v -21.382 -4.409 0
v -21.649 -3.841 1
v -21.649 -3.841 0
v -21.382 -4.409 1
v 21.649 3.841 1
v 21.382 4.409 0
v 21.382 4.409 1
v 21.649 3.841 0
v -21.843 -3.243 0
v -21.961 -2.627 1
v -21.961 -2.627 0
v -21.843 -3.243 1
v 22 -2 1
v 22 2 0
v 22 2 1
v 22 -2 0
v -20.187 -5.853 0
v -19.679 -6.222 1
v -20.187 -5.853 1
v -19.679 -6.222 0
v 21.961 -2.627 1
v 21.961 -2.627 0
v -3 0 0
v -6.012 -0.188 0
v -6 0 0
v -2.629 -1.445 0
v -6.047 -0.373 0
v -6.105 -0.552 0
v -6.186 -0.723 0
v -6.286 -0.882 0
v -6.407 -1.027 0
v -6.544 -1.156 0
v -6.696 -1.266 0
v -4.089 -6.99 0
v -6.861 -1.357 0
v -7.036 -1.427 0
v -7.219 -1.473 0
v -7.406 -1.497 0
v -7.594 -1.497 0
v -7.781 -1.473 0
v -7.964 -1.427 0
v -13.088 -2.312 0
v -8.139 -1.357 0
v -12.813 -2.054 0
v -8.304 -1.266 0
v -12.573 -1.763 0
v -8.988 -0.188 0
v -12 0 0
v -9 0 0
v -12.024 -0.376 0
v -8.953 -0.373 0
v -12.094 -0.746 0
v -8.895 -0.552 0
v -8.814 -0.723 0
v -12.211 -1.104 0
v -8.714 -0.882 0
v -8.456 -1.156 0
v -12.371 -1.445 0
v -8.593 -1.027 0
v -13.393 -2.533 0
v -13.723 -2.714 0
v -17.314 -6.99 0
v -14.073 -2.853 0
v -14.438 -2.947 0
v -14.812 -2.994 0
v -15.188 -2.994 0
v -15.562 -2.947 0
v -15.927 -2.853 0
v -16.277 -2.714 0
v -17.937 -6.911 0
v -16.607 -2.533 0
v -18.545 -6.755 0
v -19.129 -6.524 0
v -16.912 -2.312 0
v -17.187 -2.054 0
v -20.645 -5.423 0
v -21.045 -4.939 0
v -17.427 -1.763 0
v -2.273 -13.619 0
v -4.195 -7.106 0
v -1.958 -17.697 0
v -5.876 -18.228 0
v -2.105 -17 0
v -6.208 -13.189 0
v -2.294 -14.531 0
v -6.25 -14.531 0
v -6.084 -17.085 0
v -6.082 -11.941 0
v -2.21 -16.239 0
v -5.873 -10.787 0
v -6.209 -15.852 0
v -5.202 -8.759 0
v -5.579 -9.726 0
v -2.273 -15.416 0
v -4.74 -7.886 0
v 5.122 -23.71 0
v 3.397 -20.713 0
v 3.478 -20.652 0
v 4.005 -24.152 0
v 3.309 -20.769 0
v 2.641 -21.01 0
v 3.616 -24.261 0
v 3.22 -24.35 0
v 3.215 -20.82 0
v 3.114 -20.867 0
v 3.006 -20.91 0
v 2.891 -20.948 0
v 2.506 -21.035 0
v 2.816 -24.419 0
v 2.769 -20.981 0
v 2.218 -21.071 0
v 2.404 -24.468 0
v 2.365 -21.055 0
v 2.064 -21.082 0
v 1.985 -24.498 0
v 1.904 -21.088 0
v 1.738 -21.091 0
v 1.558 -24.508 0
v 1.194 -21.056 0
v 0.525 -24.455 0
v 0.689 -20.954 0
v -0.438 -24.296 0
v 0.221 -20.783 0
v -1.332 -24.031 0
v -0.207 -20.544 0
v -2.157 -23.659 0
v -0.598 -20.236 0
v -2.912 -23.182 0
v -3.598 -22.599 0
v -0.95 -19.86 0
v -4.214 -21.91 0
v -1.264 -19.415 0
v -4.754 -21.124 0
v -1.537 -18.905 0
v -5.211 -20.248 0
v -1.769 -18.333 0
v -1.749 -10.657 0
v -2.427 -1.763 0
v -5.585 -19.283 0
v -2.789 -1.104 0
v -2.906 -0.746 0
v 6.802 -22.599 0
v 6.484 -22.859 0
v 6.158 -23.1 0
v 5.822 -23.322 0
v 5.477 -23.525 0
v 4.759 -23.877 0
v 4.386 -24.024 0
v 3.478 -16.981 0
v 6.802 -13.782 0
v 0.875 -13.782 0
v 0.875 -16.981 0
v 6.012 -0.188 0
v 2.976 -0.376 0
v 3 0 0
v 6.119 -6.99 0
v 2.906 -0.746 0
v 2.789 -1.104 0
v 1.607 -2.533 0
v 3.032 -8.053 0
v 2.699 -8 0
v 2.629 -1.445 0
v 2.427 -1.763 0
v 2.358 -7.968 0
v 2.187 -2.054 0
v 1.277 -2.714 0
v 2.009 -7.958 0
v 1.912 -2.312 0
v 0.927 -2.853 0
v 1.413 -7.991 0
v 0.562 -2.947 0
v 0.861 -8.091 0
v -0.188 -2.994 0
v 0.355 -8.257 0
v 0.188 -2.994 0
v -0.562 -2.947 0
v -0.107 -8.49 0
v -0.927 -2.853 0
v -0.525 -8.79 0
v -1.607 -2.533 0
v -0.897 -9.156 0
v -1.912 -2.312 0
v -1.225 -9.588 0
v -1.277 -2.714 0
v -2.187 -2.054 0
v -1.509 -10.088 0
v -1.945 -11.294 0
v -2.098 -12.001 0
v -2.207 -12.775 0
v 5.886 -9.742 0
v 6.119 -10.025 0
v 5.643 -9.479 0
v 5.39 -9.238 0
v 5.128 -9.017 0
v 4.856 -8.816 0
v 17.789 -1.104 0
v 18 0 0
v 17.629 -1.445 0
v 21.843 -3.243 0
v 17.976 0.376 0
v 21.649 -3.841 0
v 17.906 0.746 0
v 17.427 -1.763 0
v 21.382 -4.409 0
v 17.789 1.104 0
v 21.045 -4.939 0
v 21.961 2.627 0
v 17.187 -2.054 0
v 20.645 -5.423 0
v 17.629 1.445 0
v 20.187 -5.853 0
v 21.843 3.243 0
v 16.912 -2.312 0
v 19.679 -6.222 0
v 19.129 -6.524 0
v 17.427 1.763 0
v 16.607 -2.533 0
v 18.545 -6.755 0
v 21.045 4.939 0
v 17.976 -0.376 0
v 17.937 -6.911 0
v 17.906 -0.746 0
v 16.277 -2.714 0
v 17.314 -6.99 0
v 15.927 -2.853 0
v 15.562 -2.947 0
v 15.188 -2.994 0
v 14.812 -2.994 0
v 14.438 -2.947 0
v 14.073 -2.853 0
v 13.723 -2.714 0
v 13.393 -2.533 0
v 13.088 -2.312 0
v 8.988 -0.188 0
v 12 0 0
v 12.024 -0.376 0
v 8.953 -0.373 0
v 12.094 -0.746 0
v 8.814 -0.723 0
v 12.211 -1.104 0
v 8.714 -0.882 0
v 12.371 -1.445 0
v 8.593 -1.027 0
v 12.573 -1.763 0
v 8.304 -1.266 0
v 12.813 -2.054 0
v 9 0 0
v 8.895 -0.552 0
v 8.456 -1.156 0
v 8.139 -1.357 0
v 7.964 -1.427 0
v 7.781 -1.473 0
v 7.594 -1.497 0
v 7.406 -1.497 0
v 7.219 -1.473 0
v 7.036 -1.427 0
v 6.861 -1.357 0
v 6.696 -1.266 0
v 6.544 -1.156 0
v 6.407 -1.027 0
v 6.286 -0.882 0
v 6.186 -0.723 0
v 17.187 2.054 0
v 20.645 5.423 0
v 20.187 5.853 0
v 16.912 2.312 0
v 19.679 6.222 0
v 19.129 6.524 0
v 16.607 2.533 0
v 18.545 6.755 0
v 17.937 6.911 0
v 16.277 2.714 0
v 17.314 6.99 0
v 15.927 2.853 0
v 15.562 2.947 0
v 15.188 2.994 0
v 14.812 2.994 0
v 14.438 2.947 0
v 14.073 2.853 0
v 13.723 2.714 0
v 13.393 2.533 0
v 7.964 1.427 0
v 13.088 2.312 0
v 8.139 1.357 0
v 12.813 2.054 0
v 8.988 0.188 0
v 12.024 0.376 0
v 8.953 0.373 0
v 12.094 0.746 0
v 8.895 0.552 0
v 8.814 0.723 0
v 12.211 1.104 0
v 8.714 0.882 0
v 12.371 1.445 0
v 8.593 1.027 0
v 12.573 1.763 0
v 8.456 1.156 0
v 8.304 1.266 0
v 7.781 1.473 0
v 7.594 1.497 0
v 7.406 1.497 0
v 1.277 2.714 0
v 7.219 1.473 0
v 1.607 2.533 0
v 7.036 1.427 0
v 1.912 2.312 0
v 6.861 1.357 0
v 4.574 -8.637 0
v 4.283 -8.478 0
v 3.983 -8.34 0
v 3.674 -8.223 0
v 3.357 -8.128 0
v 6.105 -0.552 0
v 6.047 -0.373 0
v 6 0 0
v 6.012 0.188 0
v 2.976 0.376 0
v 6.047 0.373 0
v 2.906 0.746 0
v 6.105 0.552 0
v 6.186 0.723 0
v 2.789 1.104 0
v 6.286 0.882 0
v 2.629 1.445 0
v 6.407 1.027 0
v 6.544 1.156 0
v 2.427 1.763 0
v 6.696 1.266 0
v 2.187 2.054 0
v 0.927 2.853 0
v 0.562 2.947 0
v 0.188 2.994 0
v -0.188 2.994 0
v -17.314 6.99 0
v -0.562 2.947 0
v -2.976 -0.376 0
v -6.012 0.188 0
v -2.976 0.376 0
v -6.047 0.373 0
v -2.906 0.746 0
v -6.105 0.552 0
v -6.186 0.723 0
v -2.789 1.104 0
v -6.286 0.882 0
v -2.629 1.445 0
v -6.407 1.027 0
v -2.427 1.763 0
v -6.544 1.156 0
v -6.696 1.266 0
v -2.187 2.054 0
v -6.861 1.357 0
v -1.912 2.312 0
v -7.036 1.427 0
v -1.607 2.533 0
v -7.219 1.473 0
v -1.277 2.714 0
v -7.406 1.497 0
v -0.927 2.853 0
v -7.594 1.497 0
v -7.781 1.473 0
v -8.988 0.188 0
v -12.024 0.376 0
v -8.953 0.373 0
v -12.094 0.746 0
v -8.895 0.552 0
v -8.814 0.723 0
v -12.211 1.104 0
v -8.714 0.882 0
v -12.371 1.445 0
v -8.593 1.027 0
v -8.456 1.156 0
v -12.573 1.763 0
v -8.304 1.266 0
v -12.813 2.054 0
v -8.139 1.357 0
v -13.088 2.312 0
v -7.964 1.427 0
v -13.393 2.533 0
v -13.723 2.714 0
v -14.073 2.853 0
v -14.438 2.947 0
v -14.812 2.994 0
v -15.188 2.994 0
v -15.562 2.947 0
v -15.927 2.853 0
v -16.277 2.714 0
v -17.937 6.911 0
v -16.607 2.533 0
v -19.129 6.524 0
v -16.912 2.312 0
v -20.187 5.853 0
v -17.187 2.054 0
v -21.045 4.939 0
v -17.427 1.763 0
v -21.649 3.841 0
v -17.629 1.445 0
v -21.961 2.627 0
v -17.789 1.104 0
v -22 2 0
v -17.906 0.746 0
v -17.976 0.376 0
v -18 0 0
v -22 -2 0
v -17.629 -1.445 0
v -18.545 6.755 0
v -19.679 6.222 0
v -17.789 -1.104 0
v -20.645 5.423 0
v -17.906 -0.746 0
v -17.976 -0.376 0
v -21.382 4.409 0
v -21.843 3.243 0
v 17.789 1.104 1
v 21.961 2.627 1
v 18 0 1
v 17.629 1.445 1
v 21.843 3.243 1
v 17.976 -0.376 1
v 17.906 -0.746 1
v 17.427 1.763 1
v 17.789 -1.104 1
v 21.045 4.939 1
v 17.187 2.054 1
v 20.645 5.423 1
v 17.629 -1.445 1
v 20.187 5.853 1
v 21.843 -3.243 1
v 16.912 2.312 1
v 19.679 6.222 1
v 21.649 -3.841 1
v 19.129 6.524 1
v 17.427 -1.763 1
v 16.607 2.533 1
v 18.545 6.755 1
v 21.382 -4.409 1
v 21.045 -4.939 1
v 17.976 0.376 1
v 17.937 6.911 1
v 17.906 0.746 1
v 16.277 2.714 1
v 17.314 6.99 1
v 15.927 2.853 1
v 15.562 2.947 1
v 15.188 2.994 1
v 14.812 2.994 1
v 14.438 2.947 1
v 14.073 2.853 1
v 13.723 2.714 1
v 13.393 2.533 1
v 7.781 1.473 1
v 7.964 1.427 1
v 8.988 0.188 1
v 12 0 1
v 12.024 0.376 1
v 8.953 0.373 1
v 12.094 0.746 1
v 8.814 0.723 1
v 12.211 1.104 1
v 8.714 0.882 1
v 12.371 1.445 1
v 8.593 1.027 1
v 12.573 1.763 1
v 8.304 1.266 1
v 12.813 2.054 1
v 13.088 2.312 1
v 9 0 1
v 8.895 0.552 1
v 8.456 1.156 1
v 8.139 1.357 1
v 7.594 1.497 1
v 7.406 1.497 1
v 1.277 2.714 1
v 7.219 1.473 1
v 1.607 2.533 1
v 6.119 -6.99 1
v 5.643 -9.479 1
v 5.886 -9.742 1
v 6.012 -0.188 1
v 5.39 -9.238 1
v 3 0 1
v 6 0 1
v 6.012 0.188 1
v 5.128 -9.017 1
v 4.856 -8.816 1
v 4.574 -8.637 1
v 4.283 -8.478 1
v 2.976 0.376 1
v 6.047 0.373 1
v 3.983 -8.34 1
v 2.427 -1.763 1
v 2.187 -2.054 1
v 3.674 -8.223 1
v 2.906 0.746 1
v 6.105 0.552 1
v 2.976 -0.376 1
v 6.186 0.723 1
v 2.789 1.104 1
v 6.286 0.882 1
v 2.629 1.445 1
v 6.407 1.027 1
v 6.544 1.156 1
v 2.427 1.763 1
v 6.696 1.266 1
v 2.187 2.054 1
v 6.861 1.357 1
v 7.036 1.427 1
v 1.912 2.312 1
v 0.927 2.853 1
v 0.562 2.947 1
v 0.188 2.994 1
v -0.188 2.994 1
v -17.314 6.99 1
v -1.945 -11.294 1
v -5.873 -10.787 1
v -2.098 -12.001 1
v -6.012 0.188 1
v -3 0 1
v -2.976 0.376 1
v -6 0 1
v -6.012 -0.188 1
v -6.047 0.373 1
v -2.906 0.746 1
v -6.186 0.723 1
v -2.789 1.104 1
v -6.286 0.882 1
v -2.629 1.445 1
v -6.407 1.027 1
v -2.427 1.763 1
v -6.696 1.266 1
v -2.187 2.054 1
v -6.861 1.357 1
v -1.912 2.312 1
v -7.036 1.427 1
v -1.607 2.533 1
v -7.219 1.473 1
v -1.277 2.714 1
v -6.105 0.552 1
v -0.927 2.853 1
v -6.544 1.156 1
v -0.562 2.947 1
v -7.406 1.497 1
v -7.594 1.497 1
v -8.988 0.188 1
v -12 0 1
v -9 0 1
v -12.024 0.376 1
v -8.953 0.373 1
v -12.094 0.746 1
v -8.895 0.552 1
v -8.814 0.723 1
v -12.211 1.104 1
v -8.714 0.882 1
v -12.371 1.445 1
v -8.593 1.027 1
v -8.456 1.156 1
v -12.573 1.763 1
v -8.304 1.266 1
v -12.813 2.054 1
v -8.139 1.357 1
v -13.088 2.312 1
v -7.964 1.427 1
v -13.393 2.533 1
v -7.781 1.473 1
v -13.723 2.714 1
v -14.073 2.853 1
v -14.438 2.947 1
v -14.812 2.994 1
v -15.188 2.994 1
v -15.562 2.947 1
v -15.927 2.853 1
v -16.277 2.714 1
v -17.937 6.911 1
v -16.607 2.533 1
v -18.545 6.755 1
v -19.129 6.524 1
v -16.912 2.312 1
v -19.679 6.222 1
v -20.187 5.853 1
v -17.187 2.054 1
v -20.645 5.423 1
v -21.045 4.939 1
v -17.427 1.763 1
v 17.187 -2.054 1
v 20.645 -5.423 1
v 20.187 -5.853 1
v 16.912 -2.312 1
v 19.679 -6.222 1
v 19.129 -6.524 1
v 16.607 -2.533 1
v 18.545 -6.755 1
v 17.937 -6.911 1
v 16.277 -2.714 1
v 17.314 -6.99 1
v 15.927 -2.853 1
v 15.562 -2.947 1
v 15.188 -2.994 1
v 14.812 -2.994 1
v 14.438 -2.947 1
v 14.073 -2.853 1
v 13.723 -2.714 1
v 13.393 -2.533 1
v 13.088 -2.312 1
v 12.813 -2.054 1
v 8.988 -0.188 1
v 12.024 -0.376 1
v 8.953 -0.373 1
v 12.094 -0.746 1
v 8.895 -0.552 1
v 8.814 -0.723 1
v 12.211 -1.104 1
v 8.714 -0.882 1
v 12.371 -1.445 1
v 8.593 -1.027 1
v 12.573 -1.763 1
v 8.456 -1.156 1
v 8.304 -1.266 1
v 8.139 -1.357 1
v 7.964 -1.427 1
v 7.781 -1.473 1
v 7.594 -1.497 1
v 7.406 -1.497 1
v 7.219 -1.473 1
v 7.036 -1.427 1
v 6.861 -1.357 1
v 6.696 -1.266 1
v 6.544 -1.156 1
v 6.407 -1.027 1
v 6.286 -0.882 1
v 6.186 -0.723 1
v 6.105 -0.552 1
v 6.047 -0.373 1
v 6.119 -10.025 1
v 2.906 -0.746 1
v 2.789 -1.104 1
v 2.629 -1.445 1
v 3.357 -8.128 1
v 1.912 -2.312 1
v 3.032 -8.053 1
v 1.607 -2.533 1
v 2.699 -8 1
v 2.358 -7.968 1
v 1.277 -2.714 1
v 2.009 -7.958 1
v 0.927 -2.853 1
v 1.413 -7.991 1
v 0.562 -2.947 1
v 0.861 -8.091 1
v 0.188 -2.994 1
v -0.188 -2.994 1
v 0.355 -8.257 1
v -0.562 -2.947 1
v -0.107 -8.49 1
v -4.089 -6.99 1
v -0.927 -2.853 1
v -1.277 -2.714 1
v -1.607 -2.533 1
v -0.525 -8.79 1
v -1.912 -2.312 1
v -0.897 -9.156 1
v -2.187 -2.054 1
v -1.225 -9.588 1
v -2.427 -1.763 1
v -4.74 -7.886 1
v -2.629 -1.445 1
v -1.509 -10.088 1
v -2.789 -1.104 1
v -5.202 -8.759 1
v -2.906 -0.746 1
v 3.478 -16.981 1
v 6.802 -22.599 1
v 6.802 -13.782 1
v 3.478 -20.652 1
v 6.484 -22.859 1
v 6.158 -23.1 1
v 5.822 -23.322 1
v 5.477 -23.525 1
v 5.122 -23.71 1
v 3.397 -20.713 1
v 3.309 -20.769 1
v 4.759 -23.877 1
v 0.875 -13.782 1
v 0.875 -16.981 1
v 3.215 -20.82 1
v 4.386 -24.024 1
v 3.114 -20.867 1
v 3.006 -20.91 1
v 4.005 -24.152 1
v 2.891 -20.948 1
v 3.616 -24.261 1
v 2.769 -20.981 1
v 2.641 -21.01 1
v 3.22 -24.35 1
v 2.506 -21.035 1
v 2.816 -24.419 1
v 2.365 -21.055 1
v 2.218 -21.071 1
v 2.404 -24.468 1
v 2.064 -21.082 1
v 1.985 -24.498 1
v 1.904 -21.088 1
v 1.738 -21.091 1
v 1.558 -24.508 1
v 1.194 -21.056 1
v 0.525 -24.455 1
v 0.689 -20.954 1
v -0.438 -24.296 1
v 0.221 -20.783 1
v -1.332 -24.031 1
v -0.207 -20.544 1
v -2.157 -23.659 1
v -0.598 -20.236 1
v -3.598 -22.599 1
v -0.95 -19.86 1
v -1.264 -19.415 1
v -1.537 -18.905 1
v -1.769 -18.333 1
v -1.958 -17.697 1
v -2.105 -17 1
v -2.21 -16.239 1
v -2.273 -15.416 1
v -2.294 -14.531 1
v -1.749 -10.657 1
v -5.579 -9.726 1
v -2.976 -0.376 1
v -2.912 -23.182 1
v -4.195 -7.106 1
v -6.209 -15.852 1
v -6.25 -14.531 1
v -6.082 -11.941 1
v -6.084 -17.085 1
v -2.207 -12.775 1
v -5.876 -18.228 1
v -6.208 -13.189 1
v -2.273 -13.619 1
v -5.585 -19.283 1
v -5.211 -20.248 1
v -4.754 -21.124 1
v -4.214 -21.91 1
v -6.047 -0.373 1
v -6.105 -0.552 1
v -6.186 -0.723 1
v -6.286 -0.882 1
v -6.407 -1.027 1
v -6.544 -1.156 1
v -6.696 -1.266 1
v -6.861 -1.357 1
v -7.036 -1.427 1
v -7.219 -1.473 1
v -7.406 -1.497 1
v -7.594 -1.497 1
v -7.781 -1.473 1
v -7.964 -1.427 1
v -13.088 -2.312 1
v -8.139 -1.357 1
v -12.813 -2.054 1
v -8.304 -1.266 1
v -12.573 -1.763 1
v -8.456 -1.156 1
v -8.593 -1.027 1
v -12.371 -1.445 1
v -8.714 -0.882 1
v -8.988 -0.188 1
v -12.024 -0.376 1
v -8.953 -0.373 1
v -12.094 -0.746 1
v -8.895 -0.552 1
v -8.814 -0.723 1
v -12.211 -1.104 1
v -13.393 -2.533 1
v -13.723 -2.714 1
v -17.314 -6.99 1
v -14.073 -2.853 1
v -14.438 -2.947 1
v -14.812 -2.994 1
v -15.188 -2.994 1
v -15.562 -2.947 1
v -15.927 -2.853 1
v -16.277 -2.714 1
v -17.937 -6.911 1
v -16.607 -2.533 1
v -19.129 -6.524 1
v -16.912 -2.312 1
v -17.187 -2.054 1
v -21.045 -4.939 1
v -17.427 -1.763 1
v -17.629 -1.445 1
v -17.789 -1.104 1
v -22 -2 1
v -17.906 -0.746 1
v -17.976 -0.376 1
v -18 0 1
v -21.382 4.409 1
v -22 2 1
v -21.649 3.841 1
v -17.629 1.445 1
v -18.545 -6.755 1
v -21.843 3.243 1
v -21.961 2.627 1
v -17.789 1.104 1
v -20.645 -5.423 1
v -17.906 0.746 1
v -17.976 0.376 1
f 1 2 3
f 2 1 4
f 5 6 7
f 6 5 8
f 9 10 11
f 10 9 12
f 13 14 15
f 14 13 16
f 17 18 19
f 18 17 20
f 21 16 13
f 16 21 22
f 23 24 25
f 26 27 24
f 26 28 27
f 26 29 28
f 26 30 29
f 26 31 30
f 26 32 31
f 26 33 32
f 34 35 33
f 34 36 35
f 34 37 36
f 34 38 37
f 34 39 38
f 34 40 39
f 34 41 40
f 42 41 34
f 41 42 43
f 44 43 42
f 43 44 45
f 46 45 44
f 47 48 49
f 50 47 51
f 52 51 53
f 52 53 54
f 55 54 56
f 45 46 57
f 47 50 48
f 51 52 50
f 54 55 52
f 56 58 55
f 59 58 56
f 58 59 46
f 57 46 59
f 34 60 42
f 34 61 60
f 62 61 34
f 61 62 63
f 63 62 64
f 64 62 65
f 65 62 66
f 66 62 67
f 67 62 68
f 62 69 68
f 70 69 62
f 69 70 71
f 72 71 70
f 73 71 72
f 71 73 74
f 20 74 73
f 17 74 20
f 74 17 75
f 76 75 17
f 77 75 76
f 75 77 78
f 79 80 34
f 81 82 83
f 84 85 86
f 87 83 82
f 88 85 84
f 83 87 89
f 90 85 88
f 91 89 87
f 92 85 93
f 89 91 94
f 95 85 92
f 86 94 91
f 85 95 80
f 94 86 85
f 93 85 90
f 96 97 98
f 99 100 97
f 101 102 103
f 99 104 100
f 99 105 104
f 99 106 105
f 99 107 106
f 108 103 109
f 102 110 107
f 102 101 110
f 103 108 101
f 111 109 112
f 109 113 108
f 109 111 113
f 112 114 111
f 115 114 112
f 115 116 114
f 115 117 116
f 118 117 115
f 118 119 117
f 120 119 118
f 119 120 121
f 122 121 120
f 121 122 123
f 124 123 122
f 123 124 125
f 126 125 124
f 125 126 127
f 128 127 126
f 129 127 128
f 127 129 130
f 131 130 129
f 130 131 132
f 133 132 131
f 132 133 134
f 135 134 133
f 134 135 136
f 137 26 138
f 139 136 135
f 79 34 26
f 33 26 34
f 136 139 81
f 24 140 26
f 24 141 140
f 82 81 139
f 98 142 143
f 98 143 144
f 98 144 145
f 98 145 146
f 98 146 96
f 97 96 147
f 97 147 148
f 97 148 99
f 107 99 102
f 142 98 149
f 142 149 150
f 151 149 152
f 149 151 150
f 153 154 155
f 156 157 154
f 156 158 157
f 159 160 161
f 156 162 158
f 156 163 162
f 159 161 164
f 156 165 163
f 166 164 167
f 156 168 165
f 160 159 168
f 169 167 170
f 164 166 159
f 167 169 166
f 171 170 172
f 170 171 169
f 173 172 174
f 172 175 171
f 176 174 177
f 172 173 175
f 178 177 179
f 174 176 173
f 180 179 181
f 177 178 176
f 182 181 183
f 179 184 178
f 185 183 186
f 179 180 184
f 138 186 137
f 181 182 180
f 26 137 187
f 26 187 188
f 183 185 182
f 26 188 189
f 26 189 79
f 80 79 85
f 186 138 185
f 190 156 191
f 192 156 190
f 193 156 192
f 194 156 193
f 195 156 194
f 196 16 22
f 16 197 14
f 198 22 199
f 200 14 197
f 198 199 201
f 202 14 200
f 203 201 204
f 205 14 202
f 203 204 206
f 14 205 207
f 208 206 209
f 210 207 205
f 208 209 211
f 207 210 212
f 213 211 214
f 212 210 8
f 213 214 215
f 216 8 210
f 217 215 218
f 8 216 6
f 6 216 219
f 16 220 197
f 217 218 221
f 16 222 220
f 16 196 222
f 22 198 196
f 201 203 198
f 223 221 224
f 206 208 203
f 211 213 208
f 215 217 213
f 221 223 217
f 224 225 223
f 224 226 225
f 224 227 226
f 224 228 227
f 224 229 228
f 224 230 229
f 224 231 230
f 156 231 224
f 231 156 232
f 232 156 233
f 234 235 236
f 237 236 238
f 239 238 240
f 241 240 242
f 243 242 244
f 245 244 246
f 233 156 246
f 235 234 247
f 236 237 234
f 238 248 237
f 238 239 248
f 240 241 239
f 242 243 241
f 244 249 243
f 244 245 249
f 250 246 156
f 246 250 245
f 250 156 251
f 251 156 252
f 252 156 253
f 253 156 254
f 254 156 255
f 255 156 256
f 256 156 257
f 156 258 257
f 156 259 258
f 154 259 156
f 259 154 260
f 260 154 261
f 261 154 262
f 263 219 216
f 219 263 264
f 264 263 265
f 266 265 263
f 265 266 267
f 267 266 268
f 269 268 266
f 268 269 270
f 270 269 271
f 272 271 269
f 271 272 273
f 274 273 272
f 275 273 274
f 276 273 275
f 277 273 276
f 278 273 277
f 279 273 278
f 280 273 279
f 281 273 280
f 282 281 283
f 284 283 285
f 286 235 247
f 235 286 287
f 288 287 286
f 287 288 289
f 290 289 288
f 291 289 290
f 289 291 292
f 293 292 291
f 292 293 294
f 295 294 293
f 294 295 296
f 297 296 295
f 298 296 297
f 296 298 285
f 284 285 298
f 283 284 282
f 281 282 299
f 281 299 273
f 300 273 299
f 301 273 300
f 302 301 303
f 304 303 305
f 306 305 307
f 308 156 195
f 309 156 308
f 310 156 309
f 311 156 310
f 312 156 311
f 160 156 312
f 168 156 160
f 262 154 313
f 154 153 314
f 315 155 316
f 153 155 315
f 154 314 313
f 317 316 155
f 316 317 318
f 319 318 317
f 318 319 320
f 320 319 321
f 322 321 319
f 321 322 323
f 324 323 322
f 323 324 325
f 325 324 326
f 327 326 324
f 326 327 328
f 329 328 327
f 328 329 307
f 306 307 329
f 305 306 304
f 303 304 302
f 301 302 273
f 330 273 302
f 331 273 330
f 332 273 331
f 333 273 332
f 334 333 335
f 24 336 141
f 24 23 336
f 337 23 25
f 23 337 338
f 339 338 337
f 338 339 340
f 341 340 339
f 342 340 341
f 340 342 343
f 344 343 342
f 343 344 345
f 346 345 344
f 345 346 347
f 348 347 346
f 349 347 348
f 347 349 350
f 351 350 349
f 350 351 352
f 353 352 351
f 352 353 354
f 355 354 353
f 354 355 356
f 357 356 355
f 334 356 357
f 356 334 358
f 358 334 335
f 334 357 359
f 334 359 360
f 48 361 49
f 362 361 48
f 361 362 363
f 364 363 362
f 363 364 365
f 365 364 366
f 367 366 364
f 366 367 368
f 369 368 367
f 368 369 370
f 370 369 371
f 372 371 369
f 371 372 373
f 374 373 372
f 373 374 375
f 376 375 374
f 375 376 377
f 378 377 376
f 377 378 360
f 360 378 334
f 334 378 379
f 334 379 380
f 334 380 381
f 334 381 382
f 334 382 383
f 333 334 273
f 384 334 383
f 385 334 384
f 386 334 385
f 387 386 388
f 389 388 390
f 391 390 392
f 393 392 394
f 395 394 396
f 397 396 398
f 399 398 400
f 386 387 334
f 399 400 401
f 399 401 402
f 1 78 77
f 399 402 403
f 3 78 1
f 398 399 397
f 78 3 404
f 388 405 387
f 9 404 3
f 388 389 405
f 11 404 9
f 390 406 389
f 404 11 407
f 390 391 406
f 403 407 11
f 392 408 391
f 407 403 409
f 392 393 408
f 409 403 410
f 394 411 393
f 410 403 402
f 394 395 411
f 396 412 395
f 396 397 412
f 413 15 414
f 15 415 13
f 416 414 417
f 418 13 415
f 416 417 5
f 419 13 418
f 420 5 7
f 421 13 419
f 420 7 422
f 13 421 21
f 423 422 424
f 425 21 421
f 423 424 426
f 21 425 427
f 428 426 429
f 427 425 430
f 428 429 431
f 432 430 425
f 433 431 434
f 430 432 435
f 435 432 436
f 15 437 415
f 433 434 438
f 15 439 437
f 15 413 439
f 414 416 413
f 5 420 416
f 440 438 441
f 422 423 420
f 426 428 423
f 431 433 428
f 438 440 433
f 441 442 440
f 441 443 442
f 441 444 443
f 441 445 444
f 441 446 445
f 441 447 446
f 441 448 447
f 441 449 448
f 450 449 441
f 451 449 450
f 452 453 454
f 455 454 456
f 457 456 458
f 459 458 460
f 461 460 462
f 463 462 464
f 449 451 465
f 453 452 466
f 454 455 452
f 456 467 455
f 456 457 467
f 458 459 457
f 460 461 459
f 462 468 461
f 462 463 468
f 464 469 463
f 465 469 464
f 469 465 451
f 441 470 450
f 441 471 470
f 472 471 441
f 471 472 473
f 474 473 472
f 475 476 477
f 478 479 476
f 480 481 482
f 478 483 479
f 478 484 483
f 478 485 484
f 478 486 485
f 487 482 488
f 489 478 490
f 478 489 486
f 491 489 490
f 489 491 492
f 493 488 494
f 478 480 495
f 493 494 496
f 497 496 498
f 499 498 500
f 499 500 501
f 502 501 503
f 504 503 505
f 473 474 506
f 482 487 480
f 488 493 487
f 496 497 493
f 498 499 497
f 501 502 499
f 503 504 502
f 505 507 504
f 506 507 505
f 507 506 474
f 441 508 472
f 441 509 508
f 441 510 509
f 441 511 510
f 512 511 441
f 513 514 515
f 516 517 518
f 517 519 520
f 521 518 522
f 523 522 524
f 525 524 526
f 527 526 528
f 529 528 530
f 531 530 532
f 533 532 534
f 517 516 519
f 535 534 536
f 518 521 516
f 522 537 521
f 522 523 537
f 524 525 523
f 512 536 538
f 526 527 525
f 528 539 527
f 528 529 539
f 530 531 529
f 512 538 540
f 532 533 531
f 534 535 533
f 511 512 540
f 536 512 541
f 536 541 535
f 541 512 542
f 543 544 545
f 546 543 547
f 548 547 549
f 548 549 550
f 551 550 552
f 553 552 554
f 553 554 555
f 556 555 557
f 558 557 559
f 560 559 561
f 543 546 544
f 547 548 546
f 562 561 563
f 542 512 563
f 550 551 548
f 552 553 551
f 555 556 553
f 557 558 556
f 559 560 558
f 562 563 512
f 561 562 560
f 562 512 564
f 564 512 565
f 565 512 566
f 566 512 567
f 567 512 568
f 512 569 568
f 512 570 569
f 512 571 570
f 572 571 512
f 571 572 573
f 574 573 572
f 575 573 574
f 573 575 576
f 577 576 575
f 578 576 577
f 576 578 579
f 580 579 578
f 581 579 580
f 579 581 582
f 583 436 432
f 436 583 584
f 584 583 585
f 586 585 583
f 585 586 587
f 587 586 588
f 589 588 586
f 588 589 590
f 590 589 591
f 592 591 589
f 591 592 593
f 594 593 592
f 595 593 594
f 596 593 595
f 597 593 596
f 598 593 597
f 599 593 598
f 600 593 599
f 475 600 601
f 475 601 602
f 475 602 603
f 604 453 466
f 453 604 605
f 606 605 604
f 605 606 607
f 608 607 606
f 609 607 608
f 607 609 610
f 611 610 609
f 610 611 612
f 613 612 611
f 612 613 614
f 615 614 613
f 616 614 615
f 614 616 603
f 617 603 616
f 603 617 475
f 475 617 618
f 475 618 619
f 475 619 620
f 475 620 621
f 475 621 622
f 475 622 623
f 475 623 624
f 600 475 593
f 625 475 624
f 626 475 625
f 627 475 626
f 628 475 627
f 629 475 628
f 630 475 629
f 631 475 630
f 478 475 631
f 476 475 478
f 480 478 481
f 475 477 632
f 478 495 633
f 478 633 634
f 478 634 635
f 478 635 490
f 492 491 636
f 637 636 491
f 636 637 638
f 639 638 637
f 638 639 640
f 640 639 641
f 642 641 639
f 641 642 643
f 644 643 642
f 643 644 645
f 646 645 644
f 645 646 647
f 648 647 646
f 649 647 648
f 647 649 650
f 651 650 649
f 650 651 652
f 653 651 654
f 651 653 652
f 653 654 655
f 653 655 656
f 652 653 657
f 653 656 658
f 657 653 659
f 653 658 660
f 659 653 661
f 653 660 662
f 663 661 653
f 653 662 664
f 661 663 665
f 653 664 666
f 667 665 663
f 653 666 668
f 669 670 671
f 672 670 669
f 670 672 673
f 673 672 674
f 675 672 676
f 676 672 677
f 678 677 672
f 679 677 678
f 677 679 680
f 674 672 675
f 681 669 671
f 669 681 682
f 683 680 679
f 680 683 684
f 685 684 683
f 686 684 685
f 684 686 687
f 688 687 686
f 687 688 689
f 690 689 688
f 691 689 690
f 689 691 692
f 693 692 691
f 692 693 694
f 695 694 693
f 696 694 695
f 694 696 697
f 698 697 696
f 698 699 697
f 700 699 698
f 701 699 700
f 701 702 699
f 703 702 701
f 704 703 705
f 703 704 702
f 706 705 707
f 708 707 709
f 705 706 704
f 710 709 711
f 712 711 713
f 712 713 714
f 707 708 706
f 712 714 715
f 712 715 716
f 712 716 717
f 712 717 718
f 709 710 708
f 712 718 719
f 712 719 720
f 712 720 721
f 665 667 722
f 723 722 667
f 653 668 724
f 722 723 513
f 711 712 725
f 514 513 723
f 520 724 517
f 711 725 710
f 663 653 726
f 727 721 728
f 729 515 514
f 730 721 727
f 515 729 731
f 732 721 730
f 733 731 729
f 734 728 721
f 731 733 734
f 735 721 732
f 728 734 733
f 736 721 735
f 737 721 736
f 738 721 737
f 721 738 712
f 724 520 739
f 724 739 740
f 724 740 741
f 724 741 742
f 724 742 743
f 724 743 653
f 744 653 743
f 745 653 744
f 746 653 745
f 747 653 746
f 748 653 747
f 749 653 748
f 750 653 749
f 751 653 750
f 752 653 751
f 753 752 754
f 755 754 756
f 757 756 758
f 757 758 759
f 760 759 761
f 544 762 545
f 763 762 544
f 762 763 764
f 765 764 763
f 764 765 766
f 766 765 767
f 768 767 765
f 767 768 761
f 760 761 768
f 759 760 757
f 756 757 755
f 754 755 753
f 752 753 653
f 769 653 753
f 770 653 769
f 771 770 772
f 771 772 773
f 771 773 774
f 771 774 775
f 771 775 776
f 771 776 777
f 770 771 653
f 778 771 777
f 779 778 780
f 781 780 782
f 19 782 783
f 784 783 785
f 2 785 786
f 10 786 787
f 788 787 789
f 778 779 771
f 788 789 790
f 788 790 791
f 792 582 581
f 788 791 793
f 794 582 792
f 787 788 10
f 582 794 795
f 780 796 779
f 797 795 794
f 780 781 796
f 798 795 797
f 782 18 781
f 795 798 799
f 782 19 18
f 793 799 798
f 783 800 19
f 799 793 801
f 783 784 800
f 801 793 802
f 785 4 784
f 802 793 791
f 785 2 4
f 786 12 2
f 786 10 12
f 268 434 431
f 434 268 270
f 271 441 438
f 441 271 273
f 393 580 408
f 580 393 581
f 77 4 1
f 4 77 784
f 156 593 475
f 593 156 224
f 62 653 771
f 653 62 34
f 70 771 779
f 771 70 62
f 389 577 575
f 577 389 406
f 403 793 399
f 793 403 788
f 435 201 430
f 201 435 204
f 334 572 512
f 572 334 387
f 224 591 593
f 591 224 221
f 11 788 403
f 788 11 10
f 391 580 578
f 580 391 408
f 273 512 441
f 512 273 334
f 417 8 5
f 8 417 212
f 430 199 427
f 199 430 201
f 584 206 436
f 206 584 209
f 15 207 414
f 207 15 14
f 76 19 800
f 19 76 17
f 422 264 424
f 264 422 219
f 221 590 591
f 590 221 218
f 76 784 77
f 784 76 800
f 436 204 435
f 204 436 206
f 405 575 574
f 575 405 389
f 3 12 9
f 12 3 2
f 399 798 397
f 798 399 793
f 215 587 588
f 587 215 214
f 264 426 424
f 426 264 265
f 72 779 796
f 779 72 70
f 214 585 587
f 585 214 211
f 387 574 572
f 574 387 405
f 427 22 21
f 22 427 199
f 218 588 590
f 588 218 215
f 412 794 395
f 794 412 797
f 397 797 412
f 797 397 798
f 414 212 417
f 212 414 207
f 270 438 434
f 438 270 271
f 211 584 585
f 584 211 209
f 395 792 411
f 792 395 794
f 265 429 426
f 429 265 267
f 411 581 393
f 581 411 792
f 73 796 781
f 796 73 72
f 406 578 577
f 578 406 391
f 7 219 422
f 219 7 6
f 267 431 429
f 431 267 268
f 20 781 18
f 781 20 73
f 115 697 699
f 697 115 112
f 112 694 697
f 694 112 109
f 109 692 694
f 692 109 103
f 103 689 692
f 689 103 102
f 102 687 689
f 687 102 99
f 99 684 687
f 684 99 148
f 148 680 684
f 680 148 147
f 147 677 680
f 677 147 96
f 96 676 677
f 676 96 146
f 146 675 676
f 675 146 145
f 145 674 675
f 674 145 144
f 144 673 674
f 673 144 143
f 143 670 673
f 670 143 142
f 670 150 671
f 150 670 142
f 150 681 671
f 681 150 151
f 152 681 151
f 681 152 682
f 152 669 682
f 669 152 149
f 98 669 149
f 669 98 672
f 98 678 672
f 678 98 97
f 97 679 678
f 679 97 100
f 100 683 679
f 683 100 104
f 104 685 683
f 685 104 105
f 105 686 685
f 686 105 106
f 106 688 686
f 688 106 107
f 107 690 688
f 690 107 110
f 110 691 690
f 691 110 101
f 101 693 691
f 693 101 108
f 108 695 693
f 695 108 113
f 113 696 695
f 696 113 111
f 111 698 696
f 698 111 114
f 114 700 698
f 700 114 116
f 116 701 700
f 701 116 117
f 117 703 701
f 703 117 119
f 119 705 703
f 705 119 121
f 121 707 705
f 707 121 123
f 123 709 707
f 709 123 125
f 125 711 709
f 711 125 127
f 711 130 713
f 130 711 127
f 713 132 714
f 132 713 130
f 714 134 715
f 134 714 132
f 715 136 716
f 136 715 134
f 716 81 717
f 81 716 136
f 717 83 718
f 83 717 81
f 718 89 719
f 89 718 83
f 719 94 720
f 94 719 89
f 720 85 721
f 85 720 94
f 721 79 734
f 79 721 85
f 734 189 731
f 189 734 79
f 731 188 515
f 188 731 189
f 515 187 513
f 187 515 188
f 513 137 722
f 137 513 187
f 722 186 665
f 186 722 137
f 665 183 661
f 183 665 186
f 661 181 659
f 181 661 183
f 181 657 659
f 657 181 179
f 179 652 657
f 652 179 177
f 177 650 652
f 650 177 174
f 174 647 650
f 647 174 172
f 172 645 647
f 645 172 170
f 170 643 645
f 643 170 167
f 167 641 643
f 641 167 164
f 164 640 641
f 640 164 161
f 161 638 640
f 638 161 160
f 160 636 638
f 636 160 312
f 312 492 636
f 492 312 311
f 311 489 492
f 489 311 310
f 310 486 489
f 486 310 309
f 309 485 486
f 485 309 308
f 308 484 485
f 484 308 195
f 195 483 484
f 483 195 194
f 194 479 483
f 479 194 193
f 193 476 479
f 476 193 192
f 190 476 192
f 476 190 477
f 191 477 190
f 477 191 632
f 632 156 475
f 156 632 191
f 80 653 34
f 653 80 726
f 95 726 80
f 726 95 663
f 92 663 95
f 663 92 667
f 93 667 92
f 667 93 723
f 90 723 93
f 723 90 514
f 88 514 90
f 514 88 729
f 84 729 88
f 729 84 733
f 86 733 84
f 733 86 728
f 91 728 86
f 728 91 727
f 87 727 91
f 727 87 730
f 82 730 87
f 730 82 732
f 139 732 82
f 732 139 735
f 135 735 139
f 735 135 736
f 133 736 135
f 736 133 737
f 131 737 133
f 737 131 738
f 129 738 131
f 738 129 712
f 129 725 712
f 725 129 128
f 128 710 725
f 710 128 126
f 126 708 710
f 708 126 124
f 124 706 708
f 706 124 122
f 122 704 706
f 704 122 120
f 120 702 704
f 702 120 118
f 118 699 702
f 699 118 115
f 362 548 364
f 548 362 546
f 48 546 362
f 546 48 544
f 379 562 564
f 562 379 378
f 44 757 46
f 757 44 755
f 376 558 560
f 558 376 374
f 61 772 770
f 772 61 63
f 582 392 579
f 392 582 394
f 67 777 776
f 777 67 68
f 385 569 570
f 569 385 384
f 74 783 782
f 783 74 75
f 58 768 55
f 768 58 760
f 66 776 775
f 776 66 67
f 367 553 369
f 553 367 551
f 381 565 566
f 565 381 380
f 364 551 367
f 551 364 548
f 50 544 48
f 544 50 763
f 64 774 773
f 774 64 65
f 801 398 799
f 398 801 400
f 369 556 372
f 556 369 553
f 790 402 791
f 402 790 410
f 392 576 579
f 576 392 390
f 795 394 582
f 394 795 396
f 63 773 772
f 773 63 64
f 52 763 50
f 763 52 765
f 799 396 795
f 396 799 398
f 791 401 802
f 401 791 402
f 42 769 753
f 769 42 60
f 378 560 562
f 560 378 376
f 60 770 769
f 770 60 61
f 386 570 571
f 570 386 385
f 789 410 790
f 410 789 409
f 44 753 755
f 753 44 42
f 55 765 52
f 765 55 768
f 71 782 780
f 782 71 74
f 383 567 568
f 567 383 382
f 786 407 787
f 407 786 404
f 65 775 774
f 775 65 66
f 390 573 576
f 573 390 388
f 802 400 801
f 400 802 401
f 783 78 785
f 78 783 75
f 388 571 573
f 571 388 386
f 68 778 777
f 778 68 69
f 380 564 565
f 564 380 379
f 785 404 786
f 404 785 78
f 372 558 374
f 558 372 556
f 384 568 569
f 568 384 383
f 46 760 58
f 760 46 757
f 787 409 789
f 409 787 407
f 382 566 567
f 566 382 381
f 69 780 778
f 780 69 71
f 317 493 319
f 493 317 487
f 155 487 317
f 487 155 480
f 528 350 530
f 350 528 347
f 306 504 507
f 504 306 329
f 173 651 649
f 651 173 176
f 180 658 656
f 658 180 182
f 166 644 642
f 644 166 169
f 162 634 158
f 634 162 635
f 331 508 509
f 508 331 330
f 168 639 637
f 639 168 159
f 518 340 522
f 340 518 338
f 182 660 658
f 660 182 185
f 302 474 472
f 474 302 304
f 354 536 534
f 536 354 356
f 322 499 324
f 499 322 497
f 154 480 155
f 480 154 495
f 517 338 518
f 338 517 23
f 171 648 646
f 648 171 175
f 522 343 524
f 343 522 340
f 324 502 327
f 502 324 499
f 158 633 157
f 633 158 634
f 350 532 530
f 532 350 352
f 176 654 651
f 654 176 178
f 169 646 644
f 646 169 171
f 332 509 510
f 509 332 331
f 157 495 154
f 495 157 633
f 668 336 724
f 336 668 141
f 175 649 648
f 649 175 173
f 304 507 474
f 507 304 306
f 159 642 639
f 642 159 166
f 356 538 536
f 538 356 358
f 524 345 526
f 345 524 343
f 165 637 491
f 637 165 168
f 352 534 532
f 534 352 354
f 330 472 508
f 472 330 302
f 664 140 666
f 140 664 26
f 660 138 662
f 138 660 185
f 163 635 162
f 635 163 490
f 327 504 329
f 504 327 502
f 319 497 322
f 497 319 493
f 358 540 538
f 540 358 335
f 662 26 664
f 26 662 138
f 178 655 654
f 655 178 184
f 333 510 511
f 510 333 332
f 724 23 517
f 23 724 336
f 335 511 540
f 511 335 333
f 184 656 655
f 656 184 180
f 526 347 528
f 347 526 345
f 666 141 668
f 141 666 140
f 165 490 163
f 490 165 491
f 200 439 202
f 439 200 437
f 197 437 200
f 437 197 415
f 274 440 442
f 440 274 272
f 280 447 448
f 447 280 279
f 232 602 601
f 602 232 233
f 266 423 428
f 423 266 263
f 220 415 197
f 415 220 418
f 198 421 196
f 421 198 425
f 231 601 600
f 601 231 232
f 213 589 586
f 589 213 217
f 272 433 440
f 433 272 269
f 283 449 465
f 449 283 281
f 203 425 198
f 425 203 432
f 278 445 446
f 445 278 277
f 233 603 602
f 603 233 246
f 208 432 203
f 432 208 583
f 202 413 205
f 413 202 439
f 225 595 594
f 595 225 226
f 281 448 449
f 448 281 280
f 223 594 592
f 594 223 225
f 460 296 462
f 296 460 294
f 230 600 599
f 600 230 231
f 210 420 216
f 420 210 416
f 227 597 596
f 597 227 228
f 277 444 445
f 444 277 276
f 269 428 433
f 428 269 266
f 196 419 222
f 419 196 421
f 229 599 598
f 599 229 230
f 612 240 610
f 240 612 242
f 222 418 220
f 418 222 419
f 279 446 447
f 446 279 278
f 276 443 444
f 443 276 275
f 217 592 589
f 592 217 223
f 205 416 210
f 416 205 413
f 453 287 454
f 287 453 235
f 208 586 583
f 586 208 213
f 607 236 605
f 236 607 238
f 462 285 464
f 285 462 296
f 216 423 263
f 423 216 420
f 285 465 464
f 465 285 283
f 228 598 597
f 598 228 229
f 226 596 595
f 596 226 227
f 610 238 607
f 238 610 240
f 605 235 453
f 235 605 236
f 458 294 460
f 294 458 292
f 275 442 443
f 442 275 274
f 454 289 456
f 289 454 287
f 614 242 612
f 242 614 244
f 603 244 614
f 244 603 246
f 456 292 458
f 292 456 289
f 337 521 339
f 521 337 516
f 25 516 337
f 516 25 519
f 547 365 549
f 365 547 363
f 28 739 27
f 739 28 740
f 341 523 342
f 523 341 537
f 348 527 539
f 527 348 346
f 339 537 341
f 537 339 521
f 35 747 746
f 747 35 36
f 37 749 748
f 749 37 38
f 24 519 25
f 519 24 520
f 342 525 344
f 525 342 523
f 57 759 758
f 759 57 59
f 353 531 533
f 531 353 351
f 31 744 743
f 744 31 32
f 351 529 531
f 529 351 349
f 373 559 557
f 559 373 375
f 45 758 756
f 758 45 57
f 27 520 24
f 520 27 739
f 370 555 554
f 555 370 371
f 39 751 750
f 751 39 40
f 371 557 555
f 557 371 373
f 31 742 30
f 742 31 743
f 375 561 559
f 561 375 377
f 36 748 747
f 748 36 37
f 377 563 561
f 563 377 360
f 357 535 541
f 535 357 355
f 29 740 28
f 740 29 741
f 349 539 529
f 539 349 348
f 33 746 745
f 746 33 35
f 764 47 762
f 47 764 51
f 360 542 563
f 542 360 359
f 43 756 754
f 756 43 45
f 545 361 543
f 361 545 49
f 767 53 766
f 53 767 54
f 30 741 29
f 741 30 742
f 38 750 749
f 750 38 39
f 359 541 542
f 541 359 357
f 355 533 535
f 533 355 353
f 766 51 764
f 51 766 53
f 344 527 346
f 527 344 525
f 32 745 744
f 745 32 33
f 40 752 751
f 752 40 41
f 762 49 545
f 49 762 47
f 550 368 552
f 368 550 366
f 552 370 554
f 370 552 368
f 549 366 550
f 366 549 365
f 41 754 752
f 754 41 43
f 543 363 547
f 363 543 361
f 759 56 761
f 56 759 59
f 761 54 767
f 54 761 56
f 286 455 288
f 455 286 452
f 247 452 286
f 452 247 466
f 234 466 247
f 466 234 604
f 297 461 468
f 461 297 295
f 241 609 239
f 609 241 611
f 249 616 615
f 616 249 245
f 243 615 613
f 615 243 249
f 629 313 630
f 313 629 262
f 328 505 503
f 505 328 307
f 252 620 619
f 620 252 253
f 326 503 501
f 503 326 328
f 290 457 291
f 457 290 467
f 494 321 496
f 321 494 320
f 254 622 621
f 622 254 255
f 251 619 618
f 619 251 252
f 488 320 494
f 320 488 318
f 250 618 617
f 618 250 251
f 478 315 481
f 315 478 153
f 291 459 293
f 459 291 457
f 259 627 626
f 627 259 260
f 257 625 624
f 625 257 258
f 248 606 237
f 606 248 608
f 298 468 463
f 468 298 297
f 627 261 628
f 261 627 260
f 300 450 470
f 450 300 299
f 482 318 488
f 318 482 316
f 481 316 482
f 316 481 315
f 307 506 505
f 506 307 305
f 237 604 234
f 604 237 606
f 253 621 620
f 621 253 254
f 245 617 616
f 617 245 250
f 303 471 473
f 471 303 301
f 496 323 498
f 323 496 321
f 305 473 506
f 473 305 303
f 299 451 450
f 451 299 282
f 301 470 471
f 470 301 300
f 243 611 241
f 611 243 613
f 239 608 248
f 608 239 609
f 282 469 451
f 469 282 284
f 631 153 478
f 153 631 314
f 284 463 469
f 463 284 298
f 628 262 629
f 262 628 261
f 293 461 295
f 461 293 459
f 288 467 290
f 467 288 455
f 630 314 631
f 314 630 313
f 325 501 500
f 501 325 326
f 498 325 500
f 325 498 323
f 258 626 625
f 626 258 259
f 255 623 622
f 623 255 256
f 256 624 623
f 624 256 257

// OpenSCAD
$fn = 50;


difference() {
	union() {
		hull() {
			translate(v = [-17.0000000000, 2.0000000000, 0]) {
				cylinder(h = 1, r = 5);
			}
			translate(v = [17.0000000000, 2.0000000000, 0]) {
				cylinder(h = 1, r = 5);
			}
			translate(v = [-17.0000000000, -2.0000000000, 0]) {
				cylinder(h = 1, r = 5);
			}
			translate(v = [17.0000000000, -2.0000000000, 0]) {
				cylinder(h = 1, r = 5);
			}
		}
		translate(v = [0, -5, 0]) {
			linear_extrude(height = 1) {
				text(font = "DejaVu Sans Mono:style=Bold", halign = "center", size = 19.0000000000, text = "G", valign = "top");
			}
		}
	}
	union() {
		translate(v = [-15.0000000000, 0.0000000000, 0]) {
			translate(v = [0, 0, -100]) {
				cylinder(h = 200, r = 3.0000000000);
			}
		}
		translate(v = [0, 0, -100]) {
			cylinder(h = 200, r = 3.0000000000);
		}
		translate(v = [15.0000000000, 0.0000000000, 0]) {
			translate(v = [0, 0, -100]) {
				cylinder(h = 200, r = 3.0000000000);
			}
		}
		translate(v = [-15.0000000000, 0.0000000000, 0]) {
			translate(v = [0, 0, -100]) {
				cylinder(h = 200, r = 1.5000000000);
			}
		}
		translate(v = [-7.5000000000, 0.0000000000, 0]) {
			translate(v = [0, 0, -100]) {
				cylinder(h = 200, r = 1.5000000000);
			}
		}
		translate(v = [0, 0, -100]) {
			cylinder(h = 200, r = 1.5000000000);
		}
		translate(v = [7.5000000000, 0.0000000000, 0]) {
			translate(v = [0, 0, -100]) {
				cylinder(h = 200, r = 1.5000000000);
			}
		}
		translate(v = [15.0000000000, 0.0000000000, 0]) {
			translate(v = [0, 0, -100]) {
				cylinder(h = 200, r = 1.5000000000);
			}
		}
	}
}
